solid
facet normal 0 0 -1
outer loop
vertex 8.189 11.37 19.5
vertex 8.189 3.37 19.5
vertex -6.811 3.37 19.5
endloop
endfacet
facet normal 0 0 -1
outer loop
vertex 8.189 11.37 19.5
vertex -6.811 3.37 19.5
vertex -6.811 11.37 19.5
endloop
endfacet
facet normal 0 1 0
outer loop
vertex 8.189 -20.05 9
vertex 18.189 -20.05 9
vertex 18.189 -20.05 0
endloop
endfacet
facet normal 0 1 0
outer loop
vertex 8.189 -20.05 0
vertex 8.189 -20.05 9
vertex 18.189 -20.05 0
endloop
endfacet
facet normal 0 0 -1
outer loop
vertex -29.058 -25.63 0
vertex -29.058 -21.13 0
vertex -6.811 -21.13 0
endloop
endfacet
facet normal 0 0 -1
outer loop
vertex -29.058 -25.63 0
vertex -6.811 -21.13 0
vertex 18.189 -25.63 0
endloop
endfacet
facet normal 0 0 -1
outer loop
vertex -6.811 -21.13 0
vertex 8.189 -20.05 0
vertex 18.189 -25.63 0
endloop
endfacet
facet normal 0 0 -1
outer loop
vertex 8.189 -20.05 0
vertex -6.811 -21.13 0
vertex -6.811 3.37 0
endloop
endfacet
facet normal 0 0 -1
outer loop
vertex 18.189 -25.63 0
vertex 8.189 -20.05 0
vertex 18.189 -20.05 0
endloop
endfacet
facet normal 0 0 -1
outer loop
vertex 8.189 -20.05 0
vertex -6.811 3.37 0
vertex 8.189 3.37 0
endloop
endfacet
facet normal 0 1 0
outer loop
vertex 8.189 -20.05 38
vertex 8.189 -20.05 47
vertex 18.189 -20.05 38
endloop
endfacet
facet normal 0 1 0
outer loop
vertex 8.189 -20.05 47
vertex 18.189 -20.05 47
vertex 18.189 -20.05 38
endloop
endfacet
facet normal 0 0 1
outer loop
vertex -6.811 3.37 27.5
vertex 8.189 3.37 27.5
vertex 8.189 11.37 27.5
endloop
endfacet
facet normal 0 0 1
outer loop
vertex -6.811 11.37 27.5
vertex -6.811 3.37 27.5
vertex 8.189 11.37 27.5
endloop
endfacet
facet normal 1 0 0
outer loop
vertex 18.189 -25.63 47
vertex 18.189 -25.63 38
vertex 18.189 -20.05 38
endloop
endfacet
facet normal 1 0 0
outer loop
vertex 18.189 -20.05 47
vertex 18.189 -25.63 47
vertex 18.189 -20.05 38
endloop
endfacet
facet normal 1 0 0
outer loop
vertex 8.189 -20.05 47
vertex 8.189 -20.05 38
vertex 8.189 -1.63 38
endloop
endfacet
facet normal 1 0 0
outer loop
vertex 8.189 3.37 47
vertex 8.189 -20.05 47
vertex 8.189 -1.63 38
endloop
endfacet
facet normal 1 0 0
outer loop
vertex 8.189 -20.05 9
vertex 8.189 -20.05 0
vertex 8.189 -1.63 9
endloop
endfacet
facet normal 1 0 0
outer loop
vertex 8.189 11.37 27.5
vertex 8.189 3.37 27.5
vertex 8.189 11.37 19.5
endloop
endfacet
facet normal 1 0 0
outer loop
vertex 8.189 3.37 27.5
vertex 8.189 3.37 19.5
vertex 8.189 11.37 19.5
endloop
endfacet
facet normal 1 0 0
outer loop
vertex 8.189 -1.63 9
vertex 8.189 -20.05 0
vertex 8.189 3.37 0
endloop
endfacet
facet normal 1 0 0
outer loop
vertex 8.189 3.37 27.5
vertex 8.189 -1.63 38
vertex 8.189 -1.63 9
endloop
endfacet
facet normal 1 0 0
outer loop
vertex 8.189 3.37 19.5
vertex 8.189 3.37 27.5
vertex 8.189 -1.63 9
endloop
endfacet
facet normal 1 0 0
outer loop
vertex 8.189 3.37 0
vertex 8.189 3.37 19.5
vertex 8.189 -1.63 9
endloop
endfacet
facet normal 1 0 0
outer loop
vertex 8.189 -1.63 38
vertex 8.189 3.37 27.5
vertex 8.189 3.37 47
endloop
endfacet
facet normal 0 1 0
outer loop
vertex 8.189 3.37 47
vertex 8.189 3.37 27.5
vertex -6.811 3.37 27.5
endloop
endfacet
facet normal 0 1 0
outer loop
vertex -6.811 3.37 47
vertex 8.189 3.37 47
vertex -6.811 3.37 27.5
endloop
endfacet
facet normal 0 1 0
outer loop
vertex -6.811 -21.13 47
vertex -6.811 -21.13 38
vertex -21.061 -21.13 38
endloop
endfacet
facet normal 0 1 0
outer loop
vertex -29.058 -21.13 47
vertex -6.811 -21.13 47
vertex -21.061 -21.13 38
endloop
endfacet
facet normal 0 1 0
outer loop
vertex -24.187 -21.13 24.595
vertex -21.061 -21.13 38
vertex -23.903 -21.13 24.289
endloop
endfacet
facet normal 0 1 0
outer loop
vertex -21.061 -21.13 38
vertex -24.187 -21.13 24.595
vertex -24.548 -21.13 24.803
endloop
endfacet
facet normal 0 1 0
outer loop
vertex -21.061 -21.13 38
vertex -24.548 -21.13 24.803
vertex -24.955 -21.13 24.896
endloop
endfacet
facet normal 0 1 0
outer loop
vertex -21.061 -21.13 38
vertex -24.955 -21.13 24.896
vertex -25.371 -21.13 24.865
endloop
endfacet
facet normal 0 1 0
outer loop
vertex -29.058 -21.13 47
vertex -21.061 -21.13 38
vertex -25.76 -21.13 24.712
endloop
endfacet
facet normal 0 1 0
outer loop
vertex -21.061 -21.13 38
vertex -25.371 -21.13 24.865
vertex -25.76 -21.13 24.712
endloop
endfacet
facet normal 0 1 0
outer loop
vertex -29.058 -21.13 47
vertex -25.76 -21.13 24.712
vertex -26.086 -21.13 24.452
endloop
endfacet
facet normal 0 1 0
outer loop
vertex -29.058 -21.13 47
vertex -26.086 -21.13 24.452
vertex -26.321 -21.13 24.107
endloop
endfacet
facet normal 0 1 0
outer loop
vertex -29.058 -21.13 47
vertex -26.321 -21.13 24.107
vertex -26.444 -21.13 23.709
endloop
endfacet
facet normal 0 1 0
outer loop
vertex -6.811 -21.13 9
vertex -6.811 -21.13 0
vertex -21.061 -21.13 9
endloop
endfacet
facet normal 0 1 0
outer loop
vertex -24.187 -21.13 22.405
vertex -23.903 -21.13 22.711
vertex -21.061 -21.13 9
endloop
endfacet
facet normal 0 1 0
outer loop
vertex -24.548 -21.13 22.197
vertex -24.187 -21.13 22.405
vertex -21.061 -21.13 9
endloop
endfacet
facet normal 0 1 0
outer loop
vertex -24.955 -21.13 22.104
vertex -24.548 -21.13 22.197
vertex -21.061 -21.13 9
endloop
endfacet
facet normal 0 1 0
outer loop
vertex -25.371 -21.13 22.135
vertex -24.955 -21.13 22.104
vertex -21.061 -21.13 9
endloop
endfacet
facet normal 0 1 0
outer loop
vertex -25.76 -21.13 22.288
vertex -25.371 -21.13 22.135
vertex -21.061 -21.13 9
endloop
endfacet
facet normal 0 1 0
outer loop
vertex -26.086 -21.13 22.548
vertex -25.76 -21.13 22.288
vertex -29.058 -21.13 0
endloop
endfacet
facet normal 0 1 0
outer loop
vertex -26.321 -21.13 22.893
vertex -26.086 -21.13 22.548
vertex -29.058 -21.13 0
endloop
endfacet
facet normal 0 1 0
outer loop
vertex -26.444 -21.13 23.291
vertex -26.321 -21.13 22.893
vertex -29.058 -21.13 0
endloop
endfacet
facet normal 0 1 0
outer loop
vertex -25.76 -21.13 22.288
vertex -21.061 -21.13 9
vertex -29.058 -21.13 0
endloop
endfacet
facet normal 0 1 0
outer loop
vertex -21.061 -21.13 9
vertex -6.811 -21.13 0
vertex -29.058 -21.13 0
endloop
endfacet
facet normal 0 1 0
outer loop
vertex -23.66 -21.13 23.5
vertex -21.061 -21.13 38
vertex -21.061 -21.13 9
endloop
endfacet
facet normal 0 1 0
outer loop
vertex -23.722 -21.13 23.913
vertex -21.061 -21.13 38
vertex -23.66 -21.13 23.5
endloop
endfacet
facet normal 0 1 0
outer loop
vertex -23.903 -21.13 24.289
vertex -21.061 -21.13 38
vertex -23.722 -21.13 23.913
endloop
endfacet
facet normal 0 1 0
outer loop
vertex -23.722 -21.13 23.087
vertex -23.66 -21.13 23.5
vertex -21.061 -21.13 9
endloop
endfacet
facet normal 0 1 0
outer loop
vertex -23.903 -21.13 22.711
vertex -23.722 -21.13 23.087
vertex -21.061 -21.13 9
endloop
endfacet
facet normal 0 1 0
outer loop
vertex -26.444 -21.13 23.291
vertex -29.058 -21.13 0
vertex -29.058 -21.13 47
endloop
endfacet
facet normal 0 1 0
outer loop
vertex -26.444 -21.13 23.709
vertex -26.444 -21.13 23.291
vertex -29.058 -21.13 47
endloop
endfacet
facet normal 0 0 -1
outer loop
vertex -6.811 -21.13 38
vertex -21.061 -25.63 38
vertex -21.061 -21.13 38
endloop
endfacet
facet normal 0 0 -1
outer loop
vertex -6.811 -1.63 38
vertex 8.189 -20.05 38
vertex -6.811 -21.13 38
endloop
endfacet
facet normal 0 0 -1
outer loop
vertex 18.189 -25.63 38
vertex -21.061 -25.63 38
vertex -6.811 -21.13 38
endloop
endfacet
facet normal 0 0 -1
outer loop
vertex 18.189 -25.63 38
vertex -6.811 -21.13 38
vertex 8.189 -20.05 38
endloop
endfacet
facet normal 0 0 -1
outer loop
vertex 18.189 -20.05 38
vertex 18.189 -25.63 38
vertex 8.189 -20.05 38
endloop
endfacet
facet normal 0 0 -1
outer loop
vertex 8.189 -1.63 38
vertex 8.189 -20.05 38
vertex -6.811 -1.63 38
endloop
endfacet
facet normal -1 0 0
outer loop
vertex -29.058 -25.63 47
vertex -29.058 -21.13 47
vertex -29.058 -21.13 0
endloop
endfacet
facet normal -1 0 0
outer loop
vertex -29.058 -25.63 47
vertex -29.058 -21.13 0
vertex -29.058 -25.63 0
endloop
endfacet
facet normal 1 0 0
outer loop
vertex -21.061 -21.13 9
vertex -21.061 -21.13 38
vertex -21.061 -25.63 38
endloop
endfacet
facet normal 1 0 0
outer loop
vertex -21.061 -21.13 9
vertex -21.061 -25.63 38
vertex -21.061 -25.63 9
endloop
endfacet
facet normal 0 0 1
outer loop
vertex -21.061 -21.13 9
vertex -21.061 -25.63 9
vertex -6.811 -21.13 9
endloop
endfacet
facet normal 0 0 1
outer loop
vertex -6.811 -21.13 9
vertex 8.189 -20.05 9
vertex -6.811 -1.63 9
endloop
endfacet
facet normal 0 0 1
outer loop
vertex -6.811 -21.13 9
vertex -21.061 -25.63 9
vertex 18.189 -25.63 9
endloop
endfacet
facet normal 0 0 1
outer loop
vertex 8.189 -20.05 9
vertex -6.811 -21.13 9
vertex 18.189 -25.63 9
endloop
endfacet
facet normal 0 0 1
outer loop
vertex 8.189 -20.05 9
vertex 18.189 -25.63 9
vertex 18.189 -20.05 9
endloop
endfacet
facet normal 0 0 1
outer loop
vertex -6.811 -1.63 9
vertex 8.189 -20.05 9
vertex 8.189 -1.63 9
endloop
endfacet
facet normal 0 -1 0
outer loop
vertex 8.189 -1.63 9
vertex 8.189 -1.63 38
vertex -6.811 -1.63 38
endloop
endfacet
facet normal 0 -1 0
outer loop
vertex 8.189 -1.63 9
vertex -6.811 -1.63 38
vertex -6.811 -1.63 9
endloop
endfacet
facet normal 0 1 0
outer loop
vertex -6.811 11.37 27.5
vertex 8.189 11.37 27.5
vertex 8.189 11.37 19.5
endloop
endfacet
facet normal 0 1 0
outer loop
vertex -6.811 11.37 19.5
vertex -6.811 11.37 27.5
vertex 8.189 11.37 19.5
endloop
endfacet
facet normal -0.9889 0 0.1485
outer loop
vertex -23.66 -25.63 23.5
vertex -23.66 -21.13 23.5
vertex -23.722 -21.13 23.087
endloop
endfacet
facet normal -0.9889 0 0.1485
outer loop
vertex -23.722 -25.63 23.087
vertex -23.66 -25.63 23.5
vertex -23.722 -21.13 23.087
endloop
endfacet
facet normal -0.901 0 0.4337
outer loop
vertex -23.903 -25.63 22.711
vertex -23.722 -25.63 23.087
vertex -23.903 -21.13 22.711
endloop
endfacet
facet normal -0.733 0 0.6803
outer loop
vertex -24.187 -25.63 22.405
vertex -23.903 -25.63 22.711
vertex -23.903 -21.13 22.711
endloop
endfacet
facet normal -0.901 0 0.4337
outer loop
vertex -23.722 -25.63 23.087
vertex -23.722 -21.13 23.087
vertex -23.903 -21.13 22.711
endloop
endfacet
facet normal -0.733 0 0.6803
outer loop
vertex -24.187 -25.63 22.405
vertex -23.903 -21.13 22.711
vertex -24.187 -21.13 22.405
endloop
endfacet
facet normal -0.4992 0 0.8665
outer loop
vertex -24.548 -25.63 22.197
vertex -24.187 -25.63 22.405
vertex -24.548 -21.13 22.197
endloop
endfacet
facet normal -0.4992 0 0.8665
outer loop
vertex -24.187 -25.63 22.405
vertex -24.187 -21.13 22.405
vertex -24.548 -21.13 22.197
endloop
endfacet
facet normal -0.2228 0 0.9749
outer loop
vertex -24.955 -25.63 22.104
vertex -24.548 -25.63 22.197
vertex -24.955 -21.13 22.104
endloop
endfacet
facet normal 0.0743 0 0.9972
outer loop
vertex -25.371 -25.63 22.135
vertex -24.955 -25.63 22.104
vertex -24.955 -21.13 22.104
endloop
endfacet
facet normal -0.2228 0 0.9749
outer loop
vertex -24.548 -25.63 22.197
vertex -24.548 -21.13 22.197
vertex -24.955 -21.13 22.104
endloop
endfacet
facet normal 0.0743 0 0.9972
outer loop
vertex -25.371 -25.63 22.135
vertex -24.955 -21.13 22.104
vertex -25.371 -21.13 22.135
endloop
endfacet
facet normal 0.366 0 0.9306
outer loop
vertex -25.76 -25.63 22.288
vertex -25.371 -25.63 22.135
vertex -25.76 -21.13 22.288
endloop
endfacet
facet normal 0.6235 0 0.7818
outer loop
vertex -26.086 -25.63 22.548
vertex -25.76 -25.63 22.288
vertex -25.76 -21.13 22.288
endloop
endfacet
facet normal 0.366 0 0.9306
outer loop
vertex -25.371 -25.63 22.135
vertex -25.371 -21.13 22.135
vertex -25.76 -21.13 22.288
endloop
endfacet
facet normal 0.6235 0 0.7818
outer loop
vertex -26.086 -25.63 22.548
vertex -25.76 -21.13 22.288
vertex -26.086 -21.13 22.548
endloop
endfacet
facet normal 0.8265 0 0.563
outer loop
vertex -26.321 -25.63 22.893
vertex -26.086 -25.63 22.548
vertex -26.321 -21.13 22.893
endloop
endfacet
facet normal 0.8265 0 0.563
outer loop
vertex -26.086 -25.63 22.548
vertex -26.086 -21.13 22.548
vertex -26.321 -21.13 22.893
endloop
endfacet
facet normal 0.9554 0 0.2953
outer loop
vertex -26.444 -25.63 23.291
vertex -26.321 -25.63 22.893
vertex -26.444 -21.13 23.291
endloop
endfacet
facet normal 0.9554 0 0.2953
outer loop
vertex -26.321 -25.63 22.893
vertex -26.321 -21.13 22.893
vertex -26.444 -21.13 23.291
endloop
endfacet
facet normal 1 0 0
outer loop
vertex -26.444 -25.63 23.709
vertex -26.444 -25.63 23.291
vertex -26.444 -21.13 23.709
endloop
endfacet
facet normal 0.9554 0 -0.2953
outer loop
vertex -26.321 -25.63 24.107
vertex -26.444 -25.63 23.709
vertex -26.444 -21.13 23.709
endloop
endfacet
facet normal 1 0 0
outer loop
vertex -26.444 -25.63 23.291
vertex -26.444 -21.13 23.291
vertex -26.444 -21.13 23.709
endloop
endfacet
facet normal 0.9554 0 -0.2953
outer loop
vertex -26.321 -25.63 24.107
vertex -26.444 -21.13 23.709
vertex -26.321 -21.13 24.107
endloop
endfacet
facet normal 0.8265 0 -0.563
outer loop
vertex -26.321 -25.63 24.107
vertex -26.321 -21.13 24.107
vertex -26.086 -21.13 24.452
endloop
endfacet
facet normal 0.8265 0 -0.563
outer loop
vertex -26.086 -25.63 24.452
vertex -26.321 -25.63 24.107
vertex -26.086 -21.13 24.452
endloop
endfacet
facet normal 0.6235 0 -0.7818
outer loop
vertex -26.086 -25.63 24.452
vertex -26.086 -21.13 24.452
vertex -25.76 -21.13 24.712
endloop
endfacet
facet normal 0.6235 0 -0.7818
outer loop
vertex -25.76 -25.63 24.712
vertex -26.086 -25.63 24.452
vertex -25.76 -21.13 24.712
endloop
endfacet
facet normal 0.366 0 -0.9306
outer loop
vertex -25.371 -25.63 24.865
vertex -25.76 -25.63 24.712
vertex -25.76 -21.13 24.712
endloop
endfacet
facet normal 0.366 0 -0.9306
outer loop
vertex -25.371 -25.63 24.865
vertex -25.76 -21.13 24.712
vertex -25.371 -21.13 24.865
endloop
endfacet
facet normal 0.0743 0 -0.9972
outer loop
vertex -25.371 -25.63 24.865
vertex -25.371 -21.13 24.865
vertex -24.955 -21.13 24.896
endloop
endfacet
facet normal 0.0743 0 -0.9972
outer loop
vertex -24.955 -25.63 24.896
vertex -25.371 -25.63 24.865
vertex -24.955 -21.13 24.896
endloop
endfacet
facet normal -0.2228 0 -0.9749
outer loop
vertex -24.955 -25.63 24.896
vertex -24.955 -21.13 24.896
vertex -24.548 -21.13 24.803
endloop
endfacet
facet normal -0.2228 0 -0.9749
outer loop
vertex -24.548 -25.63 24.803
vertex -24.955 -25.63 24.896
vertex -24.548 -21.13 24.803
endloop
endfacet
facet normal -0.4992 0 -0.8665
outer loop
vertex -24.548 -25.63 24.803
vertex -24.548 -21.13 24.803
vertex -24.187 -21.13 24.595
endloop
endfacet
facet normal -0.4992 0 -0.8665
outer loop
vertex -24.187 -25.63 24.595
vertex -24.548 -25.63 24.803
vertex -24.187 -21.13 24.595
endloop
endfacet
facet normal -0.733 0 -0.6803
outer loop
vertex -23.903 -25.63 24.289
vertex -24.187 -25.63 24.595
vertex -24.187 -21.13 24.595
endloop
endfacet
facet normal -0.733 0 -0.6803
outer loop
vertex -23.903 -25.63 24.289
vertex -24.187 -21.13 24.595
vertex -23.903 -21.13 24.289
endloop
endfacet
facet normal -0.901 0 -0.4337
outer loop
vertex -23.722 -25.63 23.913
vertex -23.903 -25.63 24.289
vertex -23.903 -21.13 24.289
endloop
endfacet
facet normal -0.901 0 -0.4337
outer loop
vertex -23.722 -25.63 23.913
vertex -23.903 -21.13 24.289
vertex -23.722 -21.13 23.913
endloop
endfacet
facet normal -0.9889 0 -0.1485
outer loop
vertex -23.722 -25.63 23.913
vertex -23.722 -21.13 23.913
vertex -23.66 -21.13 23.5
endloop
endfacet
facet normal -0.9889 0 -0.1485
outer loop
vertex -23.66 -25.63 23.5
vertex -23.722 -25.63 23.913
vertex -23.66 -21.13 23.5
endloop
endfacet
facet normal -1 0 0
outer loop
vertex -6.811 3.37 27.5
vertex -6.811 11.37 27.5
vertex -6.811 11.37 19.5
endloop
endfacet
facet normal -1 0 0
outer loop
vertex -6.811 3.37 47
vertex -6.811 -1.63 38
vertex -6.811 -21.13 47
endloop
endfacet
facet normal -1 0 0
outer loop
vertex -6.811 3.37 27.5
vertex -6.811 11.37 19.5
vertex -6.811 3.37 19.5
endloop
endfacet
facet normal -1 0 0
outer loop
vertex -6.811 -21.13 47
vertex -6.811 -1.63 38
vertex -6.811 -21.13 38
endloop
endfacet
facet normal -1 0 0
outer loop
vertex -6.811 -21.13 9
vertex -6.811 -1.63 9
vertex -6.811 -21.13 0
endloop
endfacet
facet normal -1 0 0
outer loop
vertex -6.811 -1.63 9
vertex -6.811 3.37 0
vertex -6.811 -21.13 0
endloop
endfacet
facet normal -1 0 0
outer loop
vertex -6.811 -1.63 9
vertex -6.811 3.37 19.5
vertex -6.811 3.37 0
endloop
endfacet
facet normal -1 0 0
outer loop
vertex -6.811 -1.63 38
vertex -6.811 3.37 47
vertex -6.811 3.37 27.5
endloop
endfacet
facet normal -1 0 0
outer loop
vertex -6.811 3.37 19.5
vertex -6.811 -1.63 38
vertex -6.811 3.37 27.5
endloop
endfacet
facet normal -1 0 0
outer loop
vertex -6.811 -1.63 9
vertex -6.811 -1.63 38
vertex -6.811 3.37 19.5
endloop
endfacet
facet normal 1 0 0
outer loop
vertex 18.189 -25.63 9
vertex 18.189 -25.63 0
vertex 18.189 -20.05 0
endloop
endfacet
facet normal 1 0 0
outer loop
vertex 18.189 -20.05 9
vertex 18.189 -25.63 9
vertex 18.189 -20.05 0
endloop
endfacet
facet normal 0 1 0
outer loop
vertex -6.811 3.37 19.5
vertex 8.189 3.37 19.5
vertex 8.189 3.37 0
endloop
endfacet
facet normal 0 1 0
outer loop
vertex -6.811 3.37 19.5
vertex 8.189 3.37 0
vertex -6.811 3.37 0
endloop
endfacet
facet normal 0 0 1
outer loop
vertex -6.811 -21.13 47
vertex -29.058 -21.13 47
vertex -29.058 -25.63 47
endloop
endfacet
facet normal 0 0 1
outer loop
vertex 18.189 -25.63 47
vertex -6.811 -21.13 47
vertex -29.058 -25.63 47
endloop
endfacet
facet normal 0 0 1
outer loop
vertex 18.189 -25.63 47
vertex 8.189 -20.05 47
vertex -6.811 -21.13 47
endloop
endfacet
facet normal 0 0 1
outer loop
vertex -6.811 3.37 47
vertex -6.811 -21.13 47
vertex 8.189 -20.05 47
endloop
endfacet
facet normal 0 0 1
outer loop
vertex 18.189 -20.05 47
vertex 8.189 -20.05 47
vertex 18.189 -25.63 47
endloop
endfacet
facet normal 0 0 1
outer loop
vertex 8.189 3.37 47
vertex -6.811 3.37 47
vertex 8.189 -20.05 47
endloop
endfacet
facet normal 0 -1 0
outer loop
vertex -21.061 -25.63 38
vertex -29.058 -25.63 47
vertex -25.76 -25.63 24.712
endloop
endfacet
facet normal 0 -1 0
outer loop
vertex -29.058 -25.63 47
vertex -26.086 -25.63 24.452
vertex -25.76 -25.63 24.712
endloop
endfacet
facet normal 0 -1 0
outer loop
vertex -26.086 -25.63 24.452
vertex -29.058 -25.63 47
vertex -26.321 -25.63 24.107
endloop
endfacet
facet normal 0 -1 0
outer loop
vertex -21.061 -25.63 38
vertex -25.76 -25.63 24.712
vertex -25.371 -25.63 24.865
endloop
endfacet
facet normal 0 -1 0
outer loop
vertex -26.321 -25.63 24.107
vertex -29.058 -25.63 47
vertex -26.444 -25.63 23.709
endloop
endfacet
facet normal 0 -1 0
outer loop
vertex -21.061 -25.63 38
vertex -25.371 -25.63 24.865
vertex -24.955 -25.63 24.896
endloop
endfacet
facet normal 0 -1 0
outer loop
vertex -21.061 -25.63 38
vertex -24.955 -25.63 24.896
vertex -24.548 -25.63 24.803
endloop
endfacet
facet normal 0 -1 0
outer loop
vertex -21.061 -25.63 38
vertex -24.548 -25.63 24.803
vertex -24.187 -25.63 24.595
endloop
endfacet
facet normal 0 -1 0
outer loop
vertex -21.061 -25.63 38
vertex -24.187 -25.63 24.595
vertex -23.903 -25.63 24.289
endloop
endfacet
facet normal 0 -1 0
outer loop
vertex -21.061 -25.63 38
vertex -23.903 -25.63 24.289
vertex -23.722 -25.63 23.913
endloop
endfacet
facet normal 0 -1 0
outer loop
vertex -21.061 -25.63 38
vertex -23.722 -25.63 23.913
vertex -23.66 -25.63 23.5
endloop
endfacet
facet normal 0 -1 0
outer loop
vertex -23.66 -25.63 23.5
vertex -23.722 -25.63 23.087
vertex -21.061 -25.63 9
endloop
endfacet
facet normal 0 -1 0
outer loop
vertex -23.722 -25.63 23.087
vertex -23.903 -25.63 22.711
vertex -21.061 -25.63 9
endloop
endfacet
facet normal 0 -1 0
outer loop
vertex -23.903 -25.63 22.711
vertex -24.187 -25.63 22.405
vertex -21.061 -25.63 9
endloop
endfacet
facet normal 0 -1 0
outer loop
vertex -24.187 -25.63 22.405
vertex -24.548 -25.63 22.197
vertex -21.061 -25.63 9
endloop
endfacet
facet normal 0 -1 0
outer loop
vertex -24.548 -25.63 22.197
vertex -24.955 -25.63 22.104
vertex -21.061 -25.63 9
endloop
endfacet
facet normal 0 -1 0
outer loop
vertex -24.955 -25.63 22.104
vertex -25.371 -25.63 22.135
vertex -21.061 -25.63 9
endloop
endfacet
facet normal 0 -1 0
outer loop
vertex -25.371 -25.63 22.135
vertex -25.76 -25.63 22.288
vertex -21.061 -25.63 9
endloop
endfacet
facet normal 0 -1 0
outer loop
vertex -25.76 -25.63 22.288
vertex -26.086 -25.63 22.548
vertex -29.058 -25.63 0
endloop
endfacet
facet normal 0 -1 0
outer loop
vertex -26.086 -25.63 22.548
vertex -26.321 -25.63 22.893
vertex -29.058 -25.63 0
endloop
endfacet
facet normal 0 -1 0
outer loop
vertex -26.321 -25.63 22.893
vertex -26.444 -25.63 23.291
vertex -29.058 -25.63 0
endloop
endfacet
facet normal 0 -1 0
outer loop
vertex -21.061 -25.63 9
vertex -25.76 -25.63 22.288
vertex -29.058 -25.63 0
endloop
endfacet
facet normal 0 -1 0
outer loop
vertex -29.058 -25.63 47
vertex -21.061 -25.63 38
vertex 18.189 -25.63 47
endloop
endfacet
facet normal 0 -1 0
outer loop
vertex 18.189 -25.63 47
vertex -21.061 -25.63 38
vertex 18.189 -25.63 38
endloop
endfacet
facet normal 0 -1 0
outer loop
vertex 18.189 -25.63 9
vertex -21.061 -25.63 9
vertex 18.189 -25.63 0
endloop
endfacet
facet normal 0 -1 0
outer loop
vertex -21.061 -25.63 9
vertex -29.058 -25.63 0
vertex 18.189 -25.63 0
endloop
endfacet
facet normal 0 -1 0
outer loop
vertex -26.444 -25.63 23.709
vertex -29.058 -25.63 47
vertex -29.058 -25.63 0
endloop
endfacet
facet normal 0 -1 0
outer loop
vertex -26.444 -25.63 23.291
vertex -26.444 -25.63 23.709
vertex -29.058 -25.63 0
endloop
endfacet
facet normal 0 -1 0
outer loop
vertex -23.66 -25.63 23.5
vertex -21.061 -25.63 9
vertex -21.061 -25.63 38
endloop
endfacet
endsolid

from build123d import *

# Parameters (mm, degrees)
BOSS_EXTRUDE1_DEPTH = 47
SKETCH2_W           = 8
SKETCH2_H           = 8
BOSS_EXTRUDE2_DEPTH = 15
SKETCH4_W           = 29
SKETCH4_H           = 18.42
CUT_EXTRUDE4_DEPTH  = 15
SKETCH5_W           = 29
SKETCH5_H           = 5.58
CUT_EXTRUDE5_DEPTH  = 39.25
SKETCH7_R           = 1.4
CUT_EXTRUDE6_DEPTH  = 39.25


with BuildPart() as part:
    # Sketch1 → Boss-Extrude1 (new body)
    with BuildSketch(Plane.XY):
        Polygon((-6.810719807, 3.369565217), (-6.810719807, -21.130434783), (-29.058309823, -21.130434783), (-29.058309823, -25.630434783), (18.189280193, -25.630434783), (18.189280193, -20.050434783), (8.189280193, -20.050434783), (8.189280193, 3.369565217), align=None)
    extrude(amount=BOSS_EXTRUDE1_DEPTH)

    # Sketch2 → Boss-Extrude2 (add)
    with BuildSketch(Plane(origin=(8.189280193, 0, 0), x_dir=(0, 0, -1), z_dir=(1, 0, 0))):
        with Locations((-23.5, 7.369565217)):
            Rectangle(SKETCH2_W, SKETCH2_H)
    extrude(amount=-BOSS_EXTRUDE2_DEPTH)

    # Sketch4 → Cut-Extrude4 (cut)
    with BuildSketch(Plane(origin=(8.189280193, 0, 0), x_dir=(0, 0, -1), z_dir=(1, 0, 0))):
        with Locations((-23.5, -10.840434783)):
            Rectangle(SKETCH4_W, SKETCH4_H)
    extrude(amount=-CUT_EXTRUDE4_DEPTH, mode=Mode.SUBTRACT)

    # Sketch5 → Cut-Extrude5 (cut)
    with BuildSketch(Plane(origin=(18.189280193, 0, 0), x_dir=(0, 0, -1), z_dir=(1, 0, 0))):
        with Locations((-23.5, -22.840434783)):
            Rectangle(SKETCH5_W, SKETCH5_H)
    extrude(amount=-CUT_EXTRUDE5_DEPTH, mode=Mode.SUBTRACT)

    # Sketch7 → Cut-Extrude6 (cut)
    with BuildSketch(Plane(origin=(0, -21.130434783, 0), x_dir=(1, 0, 0), z_dir=(0, 1, 0))):
        with Locations((-25.059514815, -23.5)):
            Circle(SKETCH7_R)
    extrude(amount=-CUT_EXTRUDE6_DEPTH, mode=Mode.SUBTRACT)


solid = part.part
